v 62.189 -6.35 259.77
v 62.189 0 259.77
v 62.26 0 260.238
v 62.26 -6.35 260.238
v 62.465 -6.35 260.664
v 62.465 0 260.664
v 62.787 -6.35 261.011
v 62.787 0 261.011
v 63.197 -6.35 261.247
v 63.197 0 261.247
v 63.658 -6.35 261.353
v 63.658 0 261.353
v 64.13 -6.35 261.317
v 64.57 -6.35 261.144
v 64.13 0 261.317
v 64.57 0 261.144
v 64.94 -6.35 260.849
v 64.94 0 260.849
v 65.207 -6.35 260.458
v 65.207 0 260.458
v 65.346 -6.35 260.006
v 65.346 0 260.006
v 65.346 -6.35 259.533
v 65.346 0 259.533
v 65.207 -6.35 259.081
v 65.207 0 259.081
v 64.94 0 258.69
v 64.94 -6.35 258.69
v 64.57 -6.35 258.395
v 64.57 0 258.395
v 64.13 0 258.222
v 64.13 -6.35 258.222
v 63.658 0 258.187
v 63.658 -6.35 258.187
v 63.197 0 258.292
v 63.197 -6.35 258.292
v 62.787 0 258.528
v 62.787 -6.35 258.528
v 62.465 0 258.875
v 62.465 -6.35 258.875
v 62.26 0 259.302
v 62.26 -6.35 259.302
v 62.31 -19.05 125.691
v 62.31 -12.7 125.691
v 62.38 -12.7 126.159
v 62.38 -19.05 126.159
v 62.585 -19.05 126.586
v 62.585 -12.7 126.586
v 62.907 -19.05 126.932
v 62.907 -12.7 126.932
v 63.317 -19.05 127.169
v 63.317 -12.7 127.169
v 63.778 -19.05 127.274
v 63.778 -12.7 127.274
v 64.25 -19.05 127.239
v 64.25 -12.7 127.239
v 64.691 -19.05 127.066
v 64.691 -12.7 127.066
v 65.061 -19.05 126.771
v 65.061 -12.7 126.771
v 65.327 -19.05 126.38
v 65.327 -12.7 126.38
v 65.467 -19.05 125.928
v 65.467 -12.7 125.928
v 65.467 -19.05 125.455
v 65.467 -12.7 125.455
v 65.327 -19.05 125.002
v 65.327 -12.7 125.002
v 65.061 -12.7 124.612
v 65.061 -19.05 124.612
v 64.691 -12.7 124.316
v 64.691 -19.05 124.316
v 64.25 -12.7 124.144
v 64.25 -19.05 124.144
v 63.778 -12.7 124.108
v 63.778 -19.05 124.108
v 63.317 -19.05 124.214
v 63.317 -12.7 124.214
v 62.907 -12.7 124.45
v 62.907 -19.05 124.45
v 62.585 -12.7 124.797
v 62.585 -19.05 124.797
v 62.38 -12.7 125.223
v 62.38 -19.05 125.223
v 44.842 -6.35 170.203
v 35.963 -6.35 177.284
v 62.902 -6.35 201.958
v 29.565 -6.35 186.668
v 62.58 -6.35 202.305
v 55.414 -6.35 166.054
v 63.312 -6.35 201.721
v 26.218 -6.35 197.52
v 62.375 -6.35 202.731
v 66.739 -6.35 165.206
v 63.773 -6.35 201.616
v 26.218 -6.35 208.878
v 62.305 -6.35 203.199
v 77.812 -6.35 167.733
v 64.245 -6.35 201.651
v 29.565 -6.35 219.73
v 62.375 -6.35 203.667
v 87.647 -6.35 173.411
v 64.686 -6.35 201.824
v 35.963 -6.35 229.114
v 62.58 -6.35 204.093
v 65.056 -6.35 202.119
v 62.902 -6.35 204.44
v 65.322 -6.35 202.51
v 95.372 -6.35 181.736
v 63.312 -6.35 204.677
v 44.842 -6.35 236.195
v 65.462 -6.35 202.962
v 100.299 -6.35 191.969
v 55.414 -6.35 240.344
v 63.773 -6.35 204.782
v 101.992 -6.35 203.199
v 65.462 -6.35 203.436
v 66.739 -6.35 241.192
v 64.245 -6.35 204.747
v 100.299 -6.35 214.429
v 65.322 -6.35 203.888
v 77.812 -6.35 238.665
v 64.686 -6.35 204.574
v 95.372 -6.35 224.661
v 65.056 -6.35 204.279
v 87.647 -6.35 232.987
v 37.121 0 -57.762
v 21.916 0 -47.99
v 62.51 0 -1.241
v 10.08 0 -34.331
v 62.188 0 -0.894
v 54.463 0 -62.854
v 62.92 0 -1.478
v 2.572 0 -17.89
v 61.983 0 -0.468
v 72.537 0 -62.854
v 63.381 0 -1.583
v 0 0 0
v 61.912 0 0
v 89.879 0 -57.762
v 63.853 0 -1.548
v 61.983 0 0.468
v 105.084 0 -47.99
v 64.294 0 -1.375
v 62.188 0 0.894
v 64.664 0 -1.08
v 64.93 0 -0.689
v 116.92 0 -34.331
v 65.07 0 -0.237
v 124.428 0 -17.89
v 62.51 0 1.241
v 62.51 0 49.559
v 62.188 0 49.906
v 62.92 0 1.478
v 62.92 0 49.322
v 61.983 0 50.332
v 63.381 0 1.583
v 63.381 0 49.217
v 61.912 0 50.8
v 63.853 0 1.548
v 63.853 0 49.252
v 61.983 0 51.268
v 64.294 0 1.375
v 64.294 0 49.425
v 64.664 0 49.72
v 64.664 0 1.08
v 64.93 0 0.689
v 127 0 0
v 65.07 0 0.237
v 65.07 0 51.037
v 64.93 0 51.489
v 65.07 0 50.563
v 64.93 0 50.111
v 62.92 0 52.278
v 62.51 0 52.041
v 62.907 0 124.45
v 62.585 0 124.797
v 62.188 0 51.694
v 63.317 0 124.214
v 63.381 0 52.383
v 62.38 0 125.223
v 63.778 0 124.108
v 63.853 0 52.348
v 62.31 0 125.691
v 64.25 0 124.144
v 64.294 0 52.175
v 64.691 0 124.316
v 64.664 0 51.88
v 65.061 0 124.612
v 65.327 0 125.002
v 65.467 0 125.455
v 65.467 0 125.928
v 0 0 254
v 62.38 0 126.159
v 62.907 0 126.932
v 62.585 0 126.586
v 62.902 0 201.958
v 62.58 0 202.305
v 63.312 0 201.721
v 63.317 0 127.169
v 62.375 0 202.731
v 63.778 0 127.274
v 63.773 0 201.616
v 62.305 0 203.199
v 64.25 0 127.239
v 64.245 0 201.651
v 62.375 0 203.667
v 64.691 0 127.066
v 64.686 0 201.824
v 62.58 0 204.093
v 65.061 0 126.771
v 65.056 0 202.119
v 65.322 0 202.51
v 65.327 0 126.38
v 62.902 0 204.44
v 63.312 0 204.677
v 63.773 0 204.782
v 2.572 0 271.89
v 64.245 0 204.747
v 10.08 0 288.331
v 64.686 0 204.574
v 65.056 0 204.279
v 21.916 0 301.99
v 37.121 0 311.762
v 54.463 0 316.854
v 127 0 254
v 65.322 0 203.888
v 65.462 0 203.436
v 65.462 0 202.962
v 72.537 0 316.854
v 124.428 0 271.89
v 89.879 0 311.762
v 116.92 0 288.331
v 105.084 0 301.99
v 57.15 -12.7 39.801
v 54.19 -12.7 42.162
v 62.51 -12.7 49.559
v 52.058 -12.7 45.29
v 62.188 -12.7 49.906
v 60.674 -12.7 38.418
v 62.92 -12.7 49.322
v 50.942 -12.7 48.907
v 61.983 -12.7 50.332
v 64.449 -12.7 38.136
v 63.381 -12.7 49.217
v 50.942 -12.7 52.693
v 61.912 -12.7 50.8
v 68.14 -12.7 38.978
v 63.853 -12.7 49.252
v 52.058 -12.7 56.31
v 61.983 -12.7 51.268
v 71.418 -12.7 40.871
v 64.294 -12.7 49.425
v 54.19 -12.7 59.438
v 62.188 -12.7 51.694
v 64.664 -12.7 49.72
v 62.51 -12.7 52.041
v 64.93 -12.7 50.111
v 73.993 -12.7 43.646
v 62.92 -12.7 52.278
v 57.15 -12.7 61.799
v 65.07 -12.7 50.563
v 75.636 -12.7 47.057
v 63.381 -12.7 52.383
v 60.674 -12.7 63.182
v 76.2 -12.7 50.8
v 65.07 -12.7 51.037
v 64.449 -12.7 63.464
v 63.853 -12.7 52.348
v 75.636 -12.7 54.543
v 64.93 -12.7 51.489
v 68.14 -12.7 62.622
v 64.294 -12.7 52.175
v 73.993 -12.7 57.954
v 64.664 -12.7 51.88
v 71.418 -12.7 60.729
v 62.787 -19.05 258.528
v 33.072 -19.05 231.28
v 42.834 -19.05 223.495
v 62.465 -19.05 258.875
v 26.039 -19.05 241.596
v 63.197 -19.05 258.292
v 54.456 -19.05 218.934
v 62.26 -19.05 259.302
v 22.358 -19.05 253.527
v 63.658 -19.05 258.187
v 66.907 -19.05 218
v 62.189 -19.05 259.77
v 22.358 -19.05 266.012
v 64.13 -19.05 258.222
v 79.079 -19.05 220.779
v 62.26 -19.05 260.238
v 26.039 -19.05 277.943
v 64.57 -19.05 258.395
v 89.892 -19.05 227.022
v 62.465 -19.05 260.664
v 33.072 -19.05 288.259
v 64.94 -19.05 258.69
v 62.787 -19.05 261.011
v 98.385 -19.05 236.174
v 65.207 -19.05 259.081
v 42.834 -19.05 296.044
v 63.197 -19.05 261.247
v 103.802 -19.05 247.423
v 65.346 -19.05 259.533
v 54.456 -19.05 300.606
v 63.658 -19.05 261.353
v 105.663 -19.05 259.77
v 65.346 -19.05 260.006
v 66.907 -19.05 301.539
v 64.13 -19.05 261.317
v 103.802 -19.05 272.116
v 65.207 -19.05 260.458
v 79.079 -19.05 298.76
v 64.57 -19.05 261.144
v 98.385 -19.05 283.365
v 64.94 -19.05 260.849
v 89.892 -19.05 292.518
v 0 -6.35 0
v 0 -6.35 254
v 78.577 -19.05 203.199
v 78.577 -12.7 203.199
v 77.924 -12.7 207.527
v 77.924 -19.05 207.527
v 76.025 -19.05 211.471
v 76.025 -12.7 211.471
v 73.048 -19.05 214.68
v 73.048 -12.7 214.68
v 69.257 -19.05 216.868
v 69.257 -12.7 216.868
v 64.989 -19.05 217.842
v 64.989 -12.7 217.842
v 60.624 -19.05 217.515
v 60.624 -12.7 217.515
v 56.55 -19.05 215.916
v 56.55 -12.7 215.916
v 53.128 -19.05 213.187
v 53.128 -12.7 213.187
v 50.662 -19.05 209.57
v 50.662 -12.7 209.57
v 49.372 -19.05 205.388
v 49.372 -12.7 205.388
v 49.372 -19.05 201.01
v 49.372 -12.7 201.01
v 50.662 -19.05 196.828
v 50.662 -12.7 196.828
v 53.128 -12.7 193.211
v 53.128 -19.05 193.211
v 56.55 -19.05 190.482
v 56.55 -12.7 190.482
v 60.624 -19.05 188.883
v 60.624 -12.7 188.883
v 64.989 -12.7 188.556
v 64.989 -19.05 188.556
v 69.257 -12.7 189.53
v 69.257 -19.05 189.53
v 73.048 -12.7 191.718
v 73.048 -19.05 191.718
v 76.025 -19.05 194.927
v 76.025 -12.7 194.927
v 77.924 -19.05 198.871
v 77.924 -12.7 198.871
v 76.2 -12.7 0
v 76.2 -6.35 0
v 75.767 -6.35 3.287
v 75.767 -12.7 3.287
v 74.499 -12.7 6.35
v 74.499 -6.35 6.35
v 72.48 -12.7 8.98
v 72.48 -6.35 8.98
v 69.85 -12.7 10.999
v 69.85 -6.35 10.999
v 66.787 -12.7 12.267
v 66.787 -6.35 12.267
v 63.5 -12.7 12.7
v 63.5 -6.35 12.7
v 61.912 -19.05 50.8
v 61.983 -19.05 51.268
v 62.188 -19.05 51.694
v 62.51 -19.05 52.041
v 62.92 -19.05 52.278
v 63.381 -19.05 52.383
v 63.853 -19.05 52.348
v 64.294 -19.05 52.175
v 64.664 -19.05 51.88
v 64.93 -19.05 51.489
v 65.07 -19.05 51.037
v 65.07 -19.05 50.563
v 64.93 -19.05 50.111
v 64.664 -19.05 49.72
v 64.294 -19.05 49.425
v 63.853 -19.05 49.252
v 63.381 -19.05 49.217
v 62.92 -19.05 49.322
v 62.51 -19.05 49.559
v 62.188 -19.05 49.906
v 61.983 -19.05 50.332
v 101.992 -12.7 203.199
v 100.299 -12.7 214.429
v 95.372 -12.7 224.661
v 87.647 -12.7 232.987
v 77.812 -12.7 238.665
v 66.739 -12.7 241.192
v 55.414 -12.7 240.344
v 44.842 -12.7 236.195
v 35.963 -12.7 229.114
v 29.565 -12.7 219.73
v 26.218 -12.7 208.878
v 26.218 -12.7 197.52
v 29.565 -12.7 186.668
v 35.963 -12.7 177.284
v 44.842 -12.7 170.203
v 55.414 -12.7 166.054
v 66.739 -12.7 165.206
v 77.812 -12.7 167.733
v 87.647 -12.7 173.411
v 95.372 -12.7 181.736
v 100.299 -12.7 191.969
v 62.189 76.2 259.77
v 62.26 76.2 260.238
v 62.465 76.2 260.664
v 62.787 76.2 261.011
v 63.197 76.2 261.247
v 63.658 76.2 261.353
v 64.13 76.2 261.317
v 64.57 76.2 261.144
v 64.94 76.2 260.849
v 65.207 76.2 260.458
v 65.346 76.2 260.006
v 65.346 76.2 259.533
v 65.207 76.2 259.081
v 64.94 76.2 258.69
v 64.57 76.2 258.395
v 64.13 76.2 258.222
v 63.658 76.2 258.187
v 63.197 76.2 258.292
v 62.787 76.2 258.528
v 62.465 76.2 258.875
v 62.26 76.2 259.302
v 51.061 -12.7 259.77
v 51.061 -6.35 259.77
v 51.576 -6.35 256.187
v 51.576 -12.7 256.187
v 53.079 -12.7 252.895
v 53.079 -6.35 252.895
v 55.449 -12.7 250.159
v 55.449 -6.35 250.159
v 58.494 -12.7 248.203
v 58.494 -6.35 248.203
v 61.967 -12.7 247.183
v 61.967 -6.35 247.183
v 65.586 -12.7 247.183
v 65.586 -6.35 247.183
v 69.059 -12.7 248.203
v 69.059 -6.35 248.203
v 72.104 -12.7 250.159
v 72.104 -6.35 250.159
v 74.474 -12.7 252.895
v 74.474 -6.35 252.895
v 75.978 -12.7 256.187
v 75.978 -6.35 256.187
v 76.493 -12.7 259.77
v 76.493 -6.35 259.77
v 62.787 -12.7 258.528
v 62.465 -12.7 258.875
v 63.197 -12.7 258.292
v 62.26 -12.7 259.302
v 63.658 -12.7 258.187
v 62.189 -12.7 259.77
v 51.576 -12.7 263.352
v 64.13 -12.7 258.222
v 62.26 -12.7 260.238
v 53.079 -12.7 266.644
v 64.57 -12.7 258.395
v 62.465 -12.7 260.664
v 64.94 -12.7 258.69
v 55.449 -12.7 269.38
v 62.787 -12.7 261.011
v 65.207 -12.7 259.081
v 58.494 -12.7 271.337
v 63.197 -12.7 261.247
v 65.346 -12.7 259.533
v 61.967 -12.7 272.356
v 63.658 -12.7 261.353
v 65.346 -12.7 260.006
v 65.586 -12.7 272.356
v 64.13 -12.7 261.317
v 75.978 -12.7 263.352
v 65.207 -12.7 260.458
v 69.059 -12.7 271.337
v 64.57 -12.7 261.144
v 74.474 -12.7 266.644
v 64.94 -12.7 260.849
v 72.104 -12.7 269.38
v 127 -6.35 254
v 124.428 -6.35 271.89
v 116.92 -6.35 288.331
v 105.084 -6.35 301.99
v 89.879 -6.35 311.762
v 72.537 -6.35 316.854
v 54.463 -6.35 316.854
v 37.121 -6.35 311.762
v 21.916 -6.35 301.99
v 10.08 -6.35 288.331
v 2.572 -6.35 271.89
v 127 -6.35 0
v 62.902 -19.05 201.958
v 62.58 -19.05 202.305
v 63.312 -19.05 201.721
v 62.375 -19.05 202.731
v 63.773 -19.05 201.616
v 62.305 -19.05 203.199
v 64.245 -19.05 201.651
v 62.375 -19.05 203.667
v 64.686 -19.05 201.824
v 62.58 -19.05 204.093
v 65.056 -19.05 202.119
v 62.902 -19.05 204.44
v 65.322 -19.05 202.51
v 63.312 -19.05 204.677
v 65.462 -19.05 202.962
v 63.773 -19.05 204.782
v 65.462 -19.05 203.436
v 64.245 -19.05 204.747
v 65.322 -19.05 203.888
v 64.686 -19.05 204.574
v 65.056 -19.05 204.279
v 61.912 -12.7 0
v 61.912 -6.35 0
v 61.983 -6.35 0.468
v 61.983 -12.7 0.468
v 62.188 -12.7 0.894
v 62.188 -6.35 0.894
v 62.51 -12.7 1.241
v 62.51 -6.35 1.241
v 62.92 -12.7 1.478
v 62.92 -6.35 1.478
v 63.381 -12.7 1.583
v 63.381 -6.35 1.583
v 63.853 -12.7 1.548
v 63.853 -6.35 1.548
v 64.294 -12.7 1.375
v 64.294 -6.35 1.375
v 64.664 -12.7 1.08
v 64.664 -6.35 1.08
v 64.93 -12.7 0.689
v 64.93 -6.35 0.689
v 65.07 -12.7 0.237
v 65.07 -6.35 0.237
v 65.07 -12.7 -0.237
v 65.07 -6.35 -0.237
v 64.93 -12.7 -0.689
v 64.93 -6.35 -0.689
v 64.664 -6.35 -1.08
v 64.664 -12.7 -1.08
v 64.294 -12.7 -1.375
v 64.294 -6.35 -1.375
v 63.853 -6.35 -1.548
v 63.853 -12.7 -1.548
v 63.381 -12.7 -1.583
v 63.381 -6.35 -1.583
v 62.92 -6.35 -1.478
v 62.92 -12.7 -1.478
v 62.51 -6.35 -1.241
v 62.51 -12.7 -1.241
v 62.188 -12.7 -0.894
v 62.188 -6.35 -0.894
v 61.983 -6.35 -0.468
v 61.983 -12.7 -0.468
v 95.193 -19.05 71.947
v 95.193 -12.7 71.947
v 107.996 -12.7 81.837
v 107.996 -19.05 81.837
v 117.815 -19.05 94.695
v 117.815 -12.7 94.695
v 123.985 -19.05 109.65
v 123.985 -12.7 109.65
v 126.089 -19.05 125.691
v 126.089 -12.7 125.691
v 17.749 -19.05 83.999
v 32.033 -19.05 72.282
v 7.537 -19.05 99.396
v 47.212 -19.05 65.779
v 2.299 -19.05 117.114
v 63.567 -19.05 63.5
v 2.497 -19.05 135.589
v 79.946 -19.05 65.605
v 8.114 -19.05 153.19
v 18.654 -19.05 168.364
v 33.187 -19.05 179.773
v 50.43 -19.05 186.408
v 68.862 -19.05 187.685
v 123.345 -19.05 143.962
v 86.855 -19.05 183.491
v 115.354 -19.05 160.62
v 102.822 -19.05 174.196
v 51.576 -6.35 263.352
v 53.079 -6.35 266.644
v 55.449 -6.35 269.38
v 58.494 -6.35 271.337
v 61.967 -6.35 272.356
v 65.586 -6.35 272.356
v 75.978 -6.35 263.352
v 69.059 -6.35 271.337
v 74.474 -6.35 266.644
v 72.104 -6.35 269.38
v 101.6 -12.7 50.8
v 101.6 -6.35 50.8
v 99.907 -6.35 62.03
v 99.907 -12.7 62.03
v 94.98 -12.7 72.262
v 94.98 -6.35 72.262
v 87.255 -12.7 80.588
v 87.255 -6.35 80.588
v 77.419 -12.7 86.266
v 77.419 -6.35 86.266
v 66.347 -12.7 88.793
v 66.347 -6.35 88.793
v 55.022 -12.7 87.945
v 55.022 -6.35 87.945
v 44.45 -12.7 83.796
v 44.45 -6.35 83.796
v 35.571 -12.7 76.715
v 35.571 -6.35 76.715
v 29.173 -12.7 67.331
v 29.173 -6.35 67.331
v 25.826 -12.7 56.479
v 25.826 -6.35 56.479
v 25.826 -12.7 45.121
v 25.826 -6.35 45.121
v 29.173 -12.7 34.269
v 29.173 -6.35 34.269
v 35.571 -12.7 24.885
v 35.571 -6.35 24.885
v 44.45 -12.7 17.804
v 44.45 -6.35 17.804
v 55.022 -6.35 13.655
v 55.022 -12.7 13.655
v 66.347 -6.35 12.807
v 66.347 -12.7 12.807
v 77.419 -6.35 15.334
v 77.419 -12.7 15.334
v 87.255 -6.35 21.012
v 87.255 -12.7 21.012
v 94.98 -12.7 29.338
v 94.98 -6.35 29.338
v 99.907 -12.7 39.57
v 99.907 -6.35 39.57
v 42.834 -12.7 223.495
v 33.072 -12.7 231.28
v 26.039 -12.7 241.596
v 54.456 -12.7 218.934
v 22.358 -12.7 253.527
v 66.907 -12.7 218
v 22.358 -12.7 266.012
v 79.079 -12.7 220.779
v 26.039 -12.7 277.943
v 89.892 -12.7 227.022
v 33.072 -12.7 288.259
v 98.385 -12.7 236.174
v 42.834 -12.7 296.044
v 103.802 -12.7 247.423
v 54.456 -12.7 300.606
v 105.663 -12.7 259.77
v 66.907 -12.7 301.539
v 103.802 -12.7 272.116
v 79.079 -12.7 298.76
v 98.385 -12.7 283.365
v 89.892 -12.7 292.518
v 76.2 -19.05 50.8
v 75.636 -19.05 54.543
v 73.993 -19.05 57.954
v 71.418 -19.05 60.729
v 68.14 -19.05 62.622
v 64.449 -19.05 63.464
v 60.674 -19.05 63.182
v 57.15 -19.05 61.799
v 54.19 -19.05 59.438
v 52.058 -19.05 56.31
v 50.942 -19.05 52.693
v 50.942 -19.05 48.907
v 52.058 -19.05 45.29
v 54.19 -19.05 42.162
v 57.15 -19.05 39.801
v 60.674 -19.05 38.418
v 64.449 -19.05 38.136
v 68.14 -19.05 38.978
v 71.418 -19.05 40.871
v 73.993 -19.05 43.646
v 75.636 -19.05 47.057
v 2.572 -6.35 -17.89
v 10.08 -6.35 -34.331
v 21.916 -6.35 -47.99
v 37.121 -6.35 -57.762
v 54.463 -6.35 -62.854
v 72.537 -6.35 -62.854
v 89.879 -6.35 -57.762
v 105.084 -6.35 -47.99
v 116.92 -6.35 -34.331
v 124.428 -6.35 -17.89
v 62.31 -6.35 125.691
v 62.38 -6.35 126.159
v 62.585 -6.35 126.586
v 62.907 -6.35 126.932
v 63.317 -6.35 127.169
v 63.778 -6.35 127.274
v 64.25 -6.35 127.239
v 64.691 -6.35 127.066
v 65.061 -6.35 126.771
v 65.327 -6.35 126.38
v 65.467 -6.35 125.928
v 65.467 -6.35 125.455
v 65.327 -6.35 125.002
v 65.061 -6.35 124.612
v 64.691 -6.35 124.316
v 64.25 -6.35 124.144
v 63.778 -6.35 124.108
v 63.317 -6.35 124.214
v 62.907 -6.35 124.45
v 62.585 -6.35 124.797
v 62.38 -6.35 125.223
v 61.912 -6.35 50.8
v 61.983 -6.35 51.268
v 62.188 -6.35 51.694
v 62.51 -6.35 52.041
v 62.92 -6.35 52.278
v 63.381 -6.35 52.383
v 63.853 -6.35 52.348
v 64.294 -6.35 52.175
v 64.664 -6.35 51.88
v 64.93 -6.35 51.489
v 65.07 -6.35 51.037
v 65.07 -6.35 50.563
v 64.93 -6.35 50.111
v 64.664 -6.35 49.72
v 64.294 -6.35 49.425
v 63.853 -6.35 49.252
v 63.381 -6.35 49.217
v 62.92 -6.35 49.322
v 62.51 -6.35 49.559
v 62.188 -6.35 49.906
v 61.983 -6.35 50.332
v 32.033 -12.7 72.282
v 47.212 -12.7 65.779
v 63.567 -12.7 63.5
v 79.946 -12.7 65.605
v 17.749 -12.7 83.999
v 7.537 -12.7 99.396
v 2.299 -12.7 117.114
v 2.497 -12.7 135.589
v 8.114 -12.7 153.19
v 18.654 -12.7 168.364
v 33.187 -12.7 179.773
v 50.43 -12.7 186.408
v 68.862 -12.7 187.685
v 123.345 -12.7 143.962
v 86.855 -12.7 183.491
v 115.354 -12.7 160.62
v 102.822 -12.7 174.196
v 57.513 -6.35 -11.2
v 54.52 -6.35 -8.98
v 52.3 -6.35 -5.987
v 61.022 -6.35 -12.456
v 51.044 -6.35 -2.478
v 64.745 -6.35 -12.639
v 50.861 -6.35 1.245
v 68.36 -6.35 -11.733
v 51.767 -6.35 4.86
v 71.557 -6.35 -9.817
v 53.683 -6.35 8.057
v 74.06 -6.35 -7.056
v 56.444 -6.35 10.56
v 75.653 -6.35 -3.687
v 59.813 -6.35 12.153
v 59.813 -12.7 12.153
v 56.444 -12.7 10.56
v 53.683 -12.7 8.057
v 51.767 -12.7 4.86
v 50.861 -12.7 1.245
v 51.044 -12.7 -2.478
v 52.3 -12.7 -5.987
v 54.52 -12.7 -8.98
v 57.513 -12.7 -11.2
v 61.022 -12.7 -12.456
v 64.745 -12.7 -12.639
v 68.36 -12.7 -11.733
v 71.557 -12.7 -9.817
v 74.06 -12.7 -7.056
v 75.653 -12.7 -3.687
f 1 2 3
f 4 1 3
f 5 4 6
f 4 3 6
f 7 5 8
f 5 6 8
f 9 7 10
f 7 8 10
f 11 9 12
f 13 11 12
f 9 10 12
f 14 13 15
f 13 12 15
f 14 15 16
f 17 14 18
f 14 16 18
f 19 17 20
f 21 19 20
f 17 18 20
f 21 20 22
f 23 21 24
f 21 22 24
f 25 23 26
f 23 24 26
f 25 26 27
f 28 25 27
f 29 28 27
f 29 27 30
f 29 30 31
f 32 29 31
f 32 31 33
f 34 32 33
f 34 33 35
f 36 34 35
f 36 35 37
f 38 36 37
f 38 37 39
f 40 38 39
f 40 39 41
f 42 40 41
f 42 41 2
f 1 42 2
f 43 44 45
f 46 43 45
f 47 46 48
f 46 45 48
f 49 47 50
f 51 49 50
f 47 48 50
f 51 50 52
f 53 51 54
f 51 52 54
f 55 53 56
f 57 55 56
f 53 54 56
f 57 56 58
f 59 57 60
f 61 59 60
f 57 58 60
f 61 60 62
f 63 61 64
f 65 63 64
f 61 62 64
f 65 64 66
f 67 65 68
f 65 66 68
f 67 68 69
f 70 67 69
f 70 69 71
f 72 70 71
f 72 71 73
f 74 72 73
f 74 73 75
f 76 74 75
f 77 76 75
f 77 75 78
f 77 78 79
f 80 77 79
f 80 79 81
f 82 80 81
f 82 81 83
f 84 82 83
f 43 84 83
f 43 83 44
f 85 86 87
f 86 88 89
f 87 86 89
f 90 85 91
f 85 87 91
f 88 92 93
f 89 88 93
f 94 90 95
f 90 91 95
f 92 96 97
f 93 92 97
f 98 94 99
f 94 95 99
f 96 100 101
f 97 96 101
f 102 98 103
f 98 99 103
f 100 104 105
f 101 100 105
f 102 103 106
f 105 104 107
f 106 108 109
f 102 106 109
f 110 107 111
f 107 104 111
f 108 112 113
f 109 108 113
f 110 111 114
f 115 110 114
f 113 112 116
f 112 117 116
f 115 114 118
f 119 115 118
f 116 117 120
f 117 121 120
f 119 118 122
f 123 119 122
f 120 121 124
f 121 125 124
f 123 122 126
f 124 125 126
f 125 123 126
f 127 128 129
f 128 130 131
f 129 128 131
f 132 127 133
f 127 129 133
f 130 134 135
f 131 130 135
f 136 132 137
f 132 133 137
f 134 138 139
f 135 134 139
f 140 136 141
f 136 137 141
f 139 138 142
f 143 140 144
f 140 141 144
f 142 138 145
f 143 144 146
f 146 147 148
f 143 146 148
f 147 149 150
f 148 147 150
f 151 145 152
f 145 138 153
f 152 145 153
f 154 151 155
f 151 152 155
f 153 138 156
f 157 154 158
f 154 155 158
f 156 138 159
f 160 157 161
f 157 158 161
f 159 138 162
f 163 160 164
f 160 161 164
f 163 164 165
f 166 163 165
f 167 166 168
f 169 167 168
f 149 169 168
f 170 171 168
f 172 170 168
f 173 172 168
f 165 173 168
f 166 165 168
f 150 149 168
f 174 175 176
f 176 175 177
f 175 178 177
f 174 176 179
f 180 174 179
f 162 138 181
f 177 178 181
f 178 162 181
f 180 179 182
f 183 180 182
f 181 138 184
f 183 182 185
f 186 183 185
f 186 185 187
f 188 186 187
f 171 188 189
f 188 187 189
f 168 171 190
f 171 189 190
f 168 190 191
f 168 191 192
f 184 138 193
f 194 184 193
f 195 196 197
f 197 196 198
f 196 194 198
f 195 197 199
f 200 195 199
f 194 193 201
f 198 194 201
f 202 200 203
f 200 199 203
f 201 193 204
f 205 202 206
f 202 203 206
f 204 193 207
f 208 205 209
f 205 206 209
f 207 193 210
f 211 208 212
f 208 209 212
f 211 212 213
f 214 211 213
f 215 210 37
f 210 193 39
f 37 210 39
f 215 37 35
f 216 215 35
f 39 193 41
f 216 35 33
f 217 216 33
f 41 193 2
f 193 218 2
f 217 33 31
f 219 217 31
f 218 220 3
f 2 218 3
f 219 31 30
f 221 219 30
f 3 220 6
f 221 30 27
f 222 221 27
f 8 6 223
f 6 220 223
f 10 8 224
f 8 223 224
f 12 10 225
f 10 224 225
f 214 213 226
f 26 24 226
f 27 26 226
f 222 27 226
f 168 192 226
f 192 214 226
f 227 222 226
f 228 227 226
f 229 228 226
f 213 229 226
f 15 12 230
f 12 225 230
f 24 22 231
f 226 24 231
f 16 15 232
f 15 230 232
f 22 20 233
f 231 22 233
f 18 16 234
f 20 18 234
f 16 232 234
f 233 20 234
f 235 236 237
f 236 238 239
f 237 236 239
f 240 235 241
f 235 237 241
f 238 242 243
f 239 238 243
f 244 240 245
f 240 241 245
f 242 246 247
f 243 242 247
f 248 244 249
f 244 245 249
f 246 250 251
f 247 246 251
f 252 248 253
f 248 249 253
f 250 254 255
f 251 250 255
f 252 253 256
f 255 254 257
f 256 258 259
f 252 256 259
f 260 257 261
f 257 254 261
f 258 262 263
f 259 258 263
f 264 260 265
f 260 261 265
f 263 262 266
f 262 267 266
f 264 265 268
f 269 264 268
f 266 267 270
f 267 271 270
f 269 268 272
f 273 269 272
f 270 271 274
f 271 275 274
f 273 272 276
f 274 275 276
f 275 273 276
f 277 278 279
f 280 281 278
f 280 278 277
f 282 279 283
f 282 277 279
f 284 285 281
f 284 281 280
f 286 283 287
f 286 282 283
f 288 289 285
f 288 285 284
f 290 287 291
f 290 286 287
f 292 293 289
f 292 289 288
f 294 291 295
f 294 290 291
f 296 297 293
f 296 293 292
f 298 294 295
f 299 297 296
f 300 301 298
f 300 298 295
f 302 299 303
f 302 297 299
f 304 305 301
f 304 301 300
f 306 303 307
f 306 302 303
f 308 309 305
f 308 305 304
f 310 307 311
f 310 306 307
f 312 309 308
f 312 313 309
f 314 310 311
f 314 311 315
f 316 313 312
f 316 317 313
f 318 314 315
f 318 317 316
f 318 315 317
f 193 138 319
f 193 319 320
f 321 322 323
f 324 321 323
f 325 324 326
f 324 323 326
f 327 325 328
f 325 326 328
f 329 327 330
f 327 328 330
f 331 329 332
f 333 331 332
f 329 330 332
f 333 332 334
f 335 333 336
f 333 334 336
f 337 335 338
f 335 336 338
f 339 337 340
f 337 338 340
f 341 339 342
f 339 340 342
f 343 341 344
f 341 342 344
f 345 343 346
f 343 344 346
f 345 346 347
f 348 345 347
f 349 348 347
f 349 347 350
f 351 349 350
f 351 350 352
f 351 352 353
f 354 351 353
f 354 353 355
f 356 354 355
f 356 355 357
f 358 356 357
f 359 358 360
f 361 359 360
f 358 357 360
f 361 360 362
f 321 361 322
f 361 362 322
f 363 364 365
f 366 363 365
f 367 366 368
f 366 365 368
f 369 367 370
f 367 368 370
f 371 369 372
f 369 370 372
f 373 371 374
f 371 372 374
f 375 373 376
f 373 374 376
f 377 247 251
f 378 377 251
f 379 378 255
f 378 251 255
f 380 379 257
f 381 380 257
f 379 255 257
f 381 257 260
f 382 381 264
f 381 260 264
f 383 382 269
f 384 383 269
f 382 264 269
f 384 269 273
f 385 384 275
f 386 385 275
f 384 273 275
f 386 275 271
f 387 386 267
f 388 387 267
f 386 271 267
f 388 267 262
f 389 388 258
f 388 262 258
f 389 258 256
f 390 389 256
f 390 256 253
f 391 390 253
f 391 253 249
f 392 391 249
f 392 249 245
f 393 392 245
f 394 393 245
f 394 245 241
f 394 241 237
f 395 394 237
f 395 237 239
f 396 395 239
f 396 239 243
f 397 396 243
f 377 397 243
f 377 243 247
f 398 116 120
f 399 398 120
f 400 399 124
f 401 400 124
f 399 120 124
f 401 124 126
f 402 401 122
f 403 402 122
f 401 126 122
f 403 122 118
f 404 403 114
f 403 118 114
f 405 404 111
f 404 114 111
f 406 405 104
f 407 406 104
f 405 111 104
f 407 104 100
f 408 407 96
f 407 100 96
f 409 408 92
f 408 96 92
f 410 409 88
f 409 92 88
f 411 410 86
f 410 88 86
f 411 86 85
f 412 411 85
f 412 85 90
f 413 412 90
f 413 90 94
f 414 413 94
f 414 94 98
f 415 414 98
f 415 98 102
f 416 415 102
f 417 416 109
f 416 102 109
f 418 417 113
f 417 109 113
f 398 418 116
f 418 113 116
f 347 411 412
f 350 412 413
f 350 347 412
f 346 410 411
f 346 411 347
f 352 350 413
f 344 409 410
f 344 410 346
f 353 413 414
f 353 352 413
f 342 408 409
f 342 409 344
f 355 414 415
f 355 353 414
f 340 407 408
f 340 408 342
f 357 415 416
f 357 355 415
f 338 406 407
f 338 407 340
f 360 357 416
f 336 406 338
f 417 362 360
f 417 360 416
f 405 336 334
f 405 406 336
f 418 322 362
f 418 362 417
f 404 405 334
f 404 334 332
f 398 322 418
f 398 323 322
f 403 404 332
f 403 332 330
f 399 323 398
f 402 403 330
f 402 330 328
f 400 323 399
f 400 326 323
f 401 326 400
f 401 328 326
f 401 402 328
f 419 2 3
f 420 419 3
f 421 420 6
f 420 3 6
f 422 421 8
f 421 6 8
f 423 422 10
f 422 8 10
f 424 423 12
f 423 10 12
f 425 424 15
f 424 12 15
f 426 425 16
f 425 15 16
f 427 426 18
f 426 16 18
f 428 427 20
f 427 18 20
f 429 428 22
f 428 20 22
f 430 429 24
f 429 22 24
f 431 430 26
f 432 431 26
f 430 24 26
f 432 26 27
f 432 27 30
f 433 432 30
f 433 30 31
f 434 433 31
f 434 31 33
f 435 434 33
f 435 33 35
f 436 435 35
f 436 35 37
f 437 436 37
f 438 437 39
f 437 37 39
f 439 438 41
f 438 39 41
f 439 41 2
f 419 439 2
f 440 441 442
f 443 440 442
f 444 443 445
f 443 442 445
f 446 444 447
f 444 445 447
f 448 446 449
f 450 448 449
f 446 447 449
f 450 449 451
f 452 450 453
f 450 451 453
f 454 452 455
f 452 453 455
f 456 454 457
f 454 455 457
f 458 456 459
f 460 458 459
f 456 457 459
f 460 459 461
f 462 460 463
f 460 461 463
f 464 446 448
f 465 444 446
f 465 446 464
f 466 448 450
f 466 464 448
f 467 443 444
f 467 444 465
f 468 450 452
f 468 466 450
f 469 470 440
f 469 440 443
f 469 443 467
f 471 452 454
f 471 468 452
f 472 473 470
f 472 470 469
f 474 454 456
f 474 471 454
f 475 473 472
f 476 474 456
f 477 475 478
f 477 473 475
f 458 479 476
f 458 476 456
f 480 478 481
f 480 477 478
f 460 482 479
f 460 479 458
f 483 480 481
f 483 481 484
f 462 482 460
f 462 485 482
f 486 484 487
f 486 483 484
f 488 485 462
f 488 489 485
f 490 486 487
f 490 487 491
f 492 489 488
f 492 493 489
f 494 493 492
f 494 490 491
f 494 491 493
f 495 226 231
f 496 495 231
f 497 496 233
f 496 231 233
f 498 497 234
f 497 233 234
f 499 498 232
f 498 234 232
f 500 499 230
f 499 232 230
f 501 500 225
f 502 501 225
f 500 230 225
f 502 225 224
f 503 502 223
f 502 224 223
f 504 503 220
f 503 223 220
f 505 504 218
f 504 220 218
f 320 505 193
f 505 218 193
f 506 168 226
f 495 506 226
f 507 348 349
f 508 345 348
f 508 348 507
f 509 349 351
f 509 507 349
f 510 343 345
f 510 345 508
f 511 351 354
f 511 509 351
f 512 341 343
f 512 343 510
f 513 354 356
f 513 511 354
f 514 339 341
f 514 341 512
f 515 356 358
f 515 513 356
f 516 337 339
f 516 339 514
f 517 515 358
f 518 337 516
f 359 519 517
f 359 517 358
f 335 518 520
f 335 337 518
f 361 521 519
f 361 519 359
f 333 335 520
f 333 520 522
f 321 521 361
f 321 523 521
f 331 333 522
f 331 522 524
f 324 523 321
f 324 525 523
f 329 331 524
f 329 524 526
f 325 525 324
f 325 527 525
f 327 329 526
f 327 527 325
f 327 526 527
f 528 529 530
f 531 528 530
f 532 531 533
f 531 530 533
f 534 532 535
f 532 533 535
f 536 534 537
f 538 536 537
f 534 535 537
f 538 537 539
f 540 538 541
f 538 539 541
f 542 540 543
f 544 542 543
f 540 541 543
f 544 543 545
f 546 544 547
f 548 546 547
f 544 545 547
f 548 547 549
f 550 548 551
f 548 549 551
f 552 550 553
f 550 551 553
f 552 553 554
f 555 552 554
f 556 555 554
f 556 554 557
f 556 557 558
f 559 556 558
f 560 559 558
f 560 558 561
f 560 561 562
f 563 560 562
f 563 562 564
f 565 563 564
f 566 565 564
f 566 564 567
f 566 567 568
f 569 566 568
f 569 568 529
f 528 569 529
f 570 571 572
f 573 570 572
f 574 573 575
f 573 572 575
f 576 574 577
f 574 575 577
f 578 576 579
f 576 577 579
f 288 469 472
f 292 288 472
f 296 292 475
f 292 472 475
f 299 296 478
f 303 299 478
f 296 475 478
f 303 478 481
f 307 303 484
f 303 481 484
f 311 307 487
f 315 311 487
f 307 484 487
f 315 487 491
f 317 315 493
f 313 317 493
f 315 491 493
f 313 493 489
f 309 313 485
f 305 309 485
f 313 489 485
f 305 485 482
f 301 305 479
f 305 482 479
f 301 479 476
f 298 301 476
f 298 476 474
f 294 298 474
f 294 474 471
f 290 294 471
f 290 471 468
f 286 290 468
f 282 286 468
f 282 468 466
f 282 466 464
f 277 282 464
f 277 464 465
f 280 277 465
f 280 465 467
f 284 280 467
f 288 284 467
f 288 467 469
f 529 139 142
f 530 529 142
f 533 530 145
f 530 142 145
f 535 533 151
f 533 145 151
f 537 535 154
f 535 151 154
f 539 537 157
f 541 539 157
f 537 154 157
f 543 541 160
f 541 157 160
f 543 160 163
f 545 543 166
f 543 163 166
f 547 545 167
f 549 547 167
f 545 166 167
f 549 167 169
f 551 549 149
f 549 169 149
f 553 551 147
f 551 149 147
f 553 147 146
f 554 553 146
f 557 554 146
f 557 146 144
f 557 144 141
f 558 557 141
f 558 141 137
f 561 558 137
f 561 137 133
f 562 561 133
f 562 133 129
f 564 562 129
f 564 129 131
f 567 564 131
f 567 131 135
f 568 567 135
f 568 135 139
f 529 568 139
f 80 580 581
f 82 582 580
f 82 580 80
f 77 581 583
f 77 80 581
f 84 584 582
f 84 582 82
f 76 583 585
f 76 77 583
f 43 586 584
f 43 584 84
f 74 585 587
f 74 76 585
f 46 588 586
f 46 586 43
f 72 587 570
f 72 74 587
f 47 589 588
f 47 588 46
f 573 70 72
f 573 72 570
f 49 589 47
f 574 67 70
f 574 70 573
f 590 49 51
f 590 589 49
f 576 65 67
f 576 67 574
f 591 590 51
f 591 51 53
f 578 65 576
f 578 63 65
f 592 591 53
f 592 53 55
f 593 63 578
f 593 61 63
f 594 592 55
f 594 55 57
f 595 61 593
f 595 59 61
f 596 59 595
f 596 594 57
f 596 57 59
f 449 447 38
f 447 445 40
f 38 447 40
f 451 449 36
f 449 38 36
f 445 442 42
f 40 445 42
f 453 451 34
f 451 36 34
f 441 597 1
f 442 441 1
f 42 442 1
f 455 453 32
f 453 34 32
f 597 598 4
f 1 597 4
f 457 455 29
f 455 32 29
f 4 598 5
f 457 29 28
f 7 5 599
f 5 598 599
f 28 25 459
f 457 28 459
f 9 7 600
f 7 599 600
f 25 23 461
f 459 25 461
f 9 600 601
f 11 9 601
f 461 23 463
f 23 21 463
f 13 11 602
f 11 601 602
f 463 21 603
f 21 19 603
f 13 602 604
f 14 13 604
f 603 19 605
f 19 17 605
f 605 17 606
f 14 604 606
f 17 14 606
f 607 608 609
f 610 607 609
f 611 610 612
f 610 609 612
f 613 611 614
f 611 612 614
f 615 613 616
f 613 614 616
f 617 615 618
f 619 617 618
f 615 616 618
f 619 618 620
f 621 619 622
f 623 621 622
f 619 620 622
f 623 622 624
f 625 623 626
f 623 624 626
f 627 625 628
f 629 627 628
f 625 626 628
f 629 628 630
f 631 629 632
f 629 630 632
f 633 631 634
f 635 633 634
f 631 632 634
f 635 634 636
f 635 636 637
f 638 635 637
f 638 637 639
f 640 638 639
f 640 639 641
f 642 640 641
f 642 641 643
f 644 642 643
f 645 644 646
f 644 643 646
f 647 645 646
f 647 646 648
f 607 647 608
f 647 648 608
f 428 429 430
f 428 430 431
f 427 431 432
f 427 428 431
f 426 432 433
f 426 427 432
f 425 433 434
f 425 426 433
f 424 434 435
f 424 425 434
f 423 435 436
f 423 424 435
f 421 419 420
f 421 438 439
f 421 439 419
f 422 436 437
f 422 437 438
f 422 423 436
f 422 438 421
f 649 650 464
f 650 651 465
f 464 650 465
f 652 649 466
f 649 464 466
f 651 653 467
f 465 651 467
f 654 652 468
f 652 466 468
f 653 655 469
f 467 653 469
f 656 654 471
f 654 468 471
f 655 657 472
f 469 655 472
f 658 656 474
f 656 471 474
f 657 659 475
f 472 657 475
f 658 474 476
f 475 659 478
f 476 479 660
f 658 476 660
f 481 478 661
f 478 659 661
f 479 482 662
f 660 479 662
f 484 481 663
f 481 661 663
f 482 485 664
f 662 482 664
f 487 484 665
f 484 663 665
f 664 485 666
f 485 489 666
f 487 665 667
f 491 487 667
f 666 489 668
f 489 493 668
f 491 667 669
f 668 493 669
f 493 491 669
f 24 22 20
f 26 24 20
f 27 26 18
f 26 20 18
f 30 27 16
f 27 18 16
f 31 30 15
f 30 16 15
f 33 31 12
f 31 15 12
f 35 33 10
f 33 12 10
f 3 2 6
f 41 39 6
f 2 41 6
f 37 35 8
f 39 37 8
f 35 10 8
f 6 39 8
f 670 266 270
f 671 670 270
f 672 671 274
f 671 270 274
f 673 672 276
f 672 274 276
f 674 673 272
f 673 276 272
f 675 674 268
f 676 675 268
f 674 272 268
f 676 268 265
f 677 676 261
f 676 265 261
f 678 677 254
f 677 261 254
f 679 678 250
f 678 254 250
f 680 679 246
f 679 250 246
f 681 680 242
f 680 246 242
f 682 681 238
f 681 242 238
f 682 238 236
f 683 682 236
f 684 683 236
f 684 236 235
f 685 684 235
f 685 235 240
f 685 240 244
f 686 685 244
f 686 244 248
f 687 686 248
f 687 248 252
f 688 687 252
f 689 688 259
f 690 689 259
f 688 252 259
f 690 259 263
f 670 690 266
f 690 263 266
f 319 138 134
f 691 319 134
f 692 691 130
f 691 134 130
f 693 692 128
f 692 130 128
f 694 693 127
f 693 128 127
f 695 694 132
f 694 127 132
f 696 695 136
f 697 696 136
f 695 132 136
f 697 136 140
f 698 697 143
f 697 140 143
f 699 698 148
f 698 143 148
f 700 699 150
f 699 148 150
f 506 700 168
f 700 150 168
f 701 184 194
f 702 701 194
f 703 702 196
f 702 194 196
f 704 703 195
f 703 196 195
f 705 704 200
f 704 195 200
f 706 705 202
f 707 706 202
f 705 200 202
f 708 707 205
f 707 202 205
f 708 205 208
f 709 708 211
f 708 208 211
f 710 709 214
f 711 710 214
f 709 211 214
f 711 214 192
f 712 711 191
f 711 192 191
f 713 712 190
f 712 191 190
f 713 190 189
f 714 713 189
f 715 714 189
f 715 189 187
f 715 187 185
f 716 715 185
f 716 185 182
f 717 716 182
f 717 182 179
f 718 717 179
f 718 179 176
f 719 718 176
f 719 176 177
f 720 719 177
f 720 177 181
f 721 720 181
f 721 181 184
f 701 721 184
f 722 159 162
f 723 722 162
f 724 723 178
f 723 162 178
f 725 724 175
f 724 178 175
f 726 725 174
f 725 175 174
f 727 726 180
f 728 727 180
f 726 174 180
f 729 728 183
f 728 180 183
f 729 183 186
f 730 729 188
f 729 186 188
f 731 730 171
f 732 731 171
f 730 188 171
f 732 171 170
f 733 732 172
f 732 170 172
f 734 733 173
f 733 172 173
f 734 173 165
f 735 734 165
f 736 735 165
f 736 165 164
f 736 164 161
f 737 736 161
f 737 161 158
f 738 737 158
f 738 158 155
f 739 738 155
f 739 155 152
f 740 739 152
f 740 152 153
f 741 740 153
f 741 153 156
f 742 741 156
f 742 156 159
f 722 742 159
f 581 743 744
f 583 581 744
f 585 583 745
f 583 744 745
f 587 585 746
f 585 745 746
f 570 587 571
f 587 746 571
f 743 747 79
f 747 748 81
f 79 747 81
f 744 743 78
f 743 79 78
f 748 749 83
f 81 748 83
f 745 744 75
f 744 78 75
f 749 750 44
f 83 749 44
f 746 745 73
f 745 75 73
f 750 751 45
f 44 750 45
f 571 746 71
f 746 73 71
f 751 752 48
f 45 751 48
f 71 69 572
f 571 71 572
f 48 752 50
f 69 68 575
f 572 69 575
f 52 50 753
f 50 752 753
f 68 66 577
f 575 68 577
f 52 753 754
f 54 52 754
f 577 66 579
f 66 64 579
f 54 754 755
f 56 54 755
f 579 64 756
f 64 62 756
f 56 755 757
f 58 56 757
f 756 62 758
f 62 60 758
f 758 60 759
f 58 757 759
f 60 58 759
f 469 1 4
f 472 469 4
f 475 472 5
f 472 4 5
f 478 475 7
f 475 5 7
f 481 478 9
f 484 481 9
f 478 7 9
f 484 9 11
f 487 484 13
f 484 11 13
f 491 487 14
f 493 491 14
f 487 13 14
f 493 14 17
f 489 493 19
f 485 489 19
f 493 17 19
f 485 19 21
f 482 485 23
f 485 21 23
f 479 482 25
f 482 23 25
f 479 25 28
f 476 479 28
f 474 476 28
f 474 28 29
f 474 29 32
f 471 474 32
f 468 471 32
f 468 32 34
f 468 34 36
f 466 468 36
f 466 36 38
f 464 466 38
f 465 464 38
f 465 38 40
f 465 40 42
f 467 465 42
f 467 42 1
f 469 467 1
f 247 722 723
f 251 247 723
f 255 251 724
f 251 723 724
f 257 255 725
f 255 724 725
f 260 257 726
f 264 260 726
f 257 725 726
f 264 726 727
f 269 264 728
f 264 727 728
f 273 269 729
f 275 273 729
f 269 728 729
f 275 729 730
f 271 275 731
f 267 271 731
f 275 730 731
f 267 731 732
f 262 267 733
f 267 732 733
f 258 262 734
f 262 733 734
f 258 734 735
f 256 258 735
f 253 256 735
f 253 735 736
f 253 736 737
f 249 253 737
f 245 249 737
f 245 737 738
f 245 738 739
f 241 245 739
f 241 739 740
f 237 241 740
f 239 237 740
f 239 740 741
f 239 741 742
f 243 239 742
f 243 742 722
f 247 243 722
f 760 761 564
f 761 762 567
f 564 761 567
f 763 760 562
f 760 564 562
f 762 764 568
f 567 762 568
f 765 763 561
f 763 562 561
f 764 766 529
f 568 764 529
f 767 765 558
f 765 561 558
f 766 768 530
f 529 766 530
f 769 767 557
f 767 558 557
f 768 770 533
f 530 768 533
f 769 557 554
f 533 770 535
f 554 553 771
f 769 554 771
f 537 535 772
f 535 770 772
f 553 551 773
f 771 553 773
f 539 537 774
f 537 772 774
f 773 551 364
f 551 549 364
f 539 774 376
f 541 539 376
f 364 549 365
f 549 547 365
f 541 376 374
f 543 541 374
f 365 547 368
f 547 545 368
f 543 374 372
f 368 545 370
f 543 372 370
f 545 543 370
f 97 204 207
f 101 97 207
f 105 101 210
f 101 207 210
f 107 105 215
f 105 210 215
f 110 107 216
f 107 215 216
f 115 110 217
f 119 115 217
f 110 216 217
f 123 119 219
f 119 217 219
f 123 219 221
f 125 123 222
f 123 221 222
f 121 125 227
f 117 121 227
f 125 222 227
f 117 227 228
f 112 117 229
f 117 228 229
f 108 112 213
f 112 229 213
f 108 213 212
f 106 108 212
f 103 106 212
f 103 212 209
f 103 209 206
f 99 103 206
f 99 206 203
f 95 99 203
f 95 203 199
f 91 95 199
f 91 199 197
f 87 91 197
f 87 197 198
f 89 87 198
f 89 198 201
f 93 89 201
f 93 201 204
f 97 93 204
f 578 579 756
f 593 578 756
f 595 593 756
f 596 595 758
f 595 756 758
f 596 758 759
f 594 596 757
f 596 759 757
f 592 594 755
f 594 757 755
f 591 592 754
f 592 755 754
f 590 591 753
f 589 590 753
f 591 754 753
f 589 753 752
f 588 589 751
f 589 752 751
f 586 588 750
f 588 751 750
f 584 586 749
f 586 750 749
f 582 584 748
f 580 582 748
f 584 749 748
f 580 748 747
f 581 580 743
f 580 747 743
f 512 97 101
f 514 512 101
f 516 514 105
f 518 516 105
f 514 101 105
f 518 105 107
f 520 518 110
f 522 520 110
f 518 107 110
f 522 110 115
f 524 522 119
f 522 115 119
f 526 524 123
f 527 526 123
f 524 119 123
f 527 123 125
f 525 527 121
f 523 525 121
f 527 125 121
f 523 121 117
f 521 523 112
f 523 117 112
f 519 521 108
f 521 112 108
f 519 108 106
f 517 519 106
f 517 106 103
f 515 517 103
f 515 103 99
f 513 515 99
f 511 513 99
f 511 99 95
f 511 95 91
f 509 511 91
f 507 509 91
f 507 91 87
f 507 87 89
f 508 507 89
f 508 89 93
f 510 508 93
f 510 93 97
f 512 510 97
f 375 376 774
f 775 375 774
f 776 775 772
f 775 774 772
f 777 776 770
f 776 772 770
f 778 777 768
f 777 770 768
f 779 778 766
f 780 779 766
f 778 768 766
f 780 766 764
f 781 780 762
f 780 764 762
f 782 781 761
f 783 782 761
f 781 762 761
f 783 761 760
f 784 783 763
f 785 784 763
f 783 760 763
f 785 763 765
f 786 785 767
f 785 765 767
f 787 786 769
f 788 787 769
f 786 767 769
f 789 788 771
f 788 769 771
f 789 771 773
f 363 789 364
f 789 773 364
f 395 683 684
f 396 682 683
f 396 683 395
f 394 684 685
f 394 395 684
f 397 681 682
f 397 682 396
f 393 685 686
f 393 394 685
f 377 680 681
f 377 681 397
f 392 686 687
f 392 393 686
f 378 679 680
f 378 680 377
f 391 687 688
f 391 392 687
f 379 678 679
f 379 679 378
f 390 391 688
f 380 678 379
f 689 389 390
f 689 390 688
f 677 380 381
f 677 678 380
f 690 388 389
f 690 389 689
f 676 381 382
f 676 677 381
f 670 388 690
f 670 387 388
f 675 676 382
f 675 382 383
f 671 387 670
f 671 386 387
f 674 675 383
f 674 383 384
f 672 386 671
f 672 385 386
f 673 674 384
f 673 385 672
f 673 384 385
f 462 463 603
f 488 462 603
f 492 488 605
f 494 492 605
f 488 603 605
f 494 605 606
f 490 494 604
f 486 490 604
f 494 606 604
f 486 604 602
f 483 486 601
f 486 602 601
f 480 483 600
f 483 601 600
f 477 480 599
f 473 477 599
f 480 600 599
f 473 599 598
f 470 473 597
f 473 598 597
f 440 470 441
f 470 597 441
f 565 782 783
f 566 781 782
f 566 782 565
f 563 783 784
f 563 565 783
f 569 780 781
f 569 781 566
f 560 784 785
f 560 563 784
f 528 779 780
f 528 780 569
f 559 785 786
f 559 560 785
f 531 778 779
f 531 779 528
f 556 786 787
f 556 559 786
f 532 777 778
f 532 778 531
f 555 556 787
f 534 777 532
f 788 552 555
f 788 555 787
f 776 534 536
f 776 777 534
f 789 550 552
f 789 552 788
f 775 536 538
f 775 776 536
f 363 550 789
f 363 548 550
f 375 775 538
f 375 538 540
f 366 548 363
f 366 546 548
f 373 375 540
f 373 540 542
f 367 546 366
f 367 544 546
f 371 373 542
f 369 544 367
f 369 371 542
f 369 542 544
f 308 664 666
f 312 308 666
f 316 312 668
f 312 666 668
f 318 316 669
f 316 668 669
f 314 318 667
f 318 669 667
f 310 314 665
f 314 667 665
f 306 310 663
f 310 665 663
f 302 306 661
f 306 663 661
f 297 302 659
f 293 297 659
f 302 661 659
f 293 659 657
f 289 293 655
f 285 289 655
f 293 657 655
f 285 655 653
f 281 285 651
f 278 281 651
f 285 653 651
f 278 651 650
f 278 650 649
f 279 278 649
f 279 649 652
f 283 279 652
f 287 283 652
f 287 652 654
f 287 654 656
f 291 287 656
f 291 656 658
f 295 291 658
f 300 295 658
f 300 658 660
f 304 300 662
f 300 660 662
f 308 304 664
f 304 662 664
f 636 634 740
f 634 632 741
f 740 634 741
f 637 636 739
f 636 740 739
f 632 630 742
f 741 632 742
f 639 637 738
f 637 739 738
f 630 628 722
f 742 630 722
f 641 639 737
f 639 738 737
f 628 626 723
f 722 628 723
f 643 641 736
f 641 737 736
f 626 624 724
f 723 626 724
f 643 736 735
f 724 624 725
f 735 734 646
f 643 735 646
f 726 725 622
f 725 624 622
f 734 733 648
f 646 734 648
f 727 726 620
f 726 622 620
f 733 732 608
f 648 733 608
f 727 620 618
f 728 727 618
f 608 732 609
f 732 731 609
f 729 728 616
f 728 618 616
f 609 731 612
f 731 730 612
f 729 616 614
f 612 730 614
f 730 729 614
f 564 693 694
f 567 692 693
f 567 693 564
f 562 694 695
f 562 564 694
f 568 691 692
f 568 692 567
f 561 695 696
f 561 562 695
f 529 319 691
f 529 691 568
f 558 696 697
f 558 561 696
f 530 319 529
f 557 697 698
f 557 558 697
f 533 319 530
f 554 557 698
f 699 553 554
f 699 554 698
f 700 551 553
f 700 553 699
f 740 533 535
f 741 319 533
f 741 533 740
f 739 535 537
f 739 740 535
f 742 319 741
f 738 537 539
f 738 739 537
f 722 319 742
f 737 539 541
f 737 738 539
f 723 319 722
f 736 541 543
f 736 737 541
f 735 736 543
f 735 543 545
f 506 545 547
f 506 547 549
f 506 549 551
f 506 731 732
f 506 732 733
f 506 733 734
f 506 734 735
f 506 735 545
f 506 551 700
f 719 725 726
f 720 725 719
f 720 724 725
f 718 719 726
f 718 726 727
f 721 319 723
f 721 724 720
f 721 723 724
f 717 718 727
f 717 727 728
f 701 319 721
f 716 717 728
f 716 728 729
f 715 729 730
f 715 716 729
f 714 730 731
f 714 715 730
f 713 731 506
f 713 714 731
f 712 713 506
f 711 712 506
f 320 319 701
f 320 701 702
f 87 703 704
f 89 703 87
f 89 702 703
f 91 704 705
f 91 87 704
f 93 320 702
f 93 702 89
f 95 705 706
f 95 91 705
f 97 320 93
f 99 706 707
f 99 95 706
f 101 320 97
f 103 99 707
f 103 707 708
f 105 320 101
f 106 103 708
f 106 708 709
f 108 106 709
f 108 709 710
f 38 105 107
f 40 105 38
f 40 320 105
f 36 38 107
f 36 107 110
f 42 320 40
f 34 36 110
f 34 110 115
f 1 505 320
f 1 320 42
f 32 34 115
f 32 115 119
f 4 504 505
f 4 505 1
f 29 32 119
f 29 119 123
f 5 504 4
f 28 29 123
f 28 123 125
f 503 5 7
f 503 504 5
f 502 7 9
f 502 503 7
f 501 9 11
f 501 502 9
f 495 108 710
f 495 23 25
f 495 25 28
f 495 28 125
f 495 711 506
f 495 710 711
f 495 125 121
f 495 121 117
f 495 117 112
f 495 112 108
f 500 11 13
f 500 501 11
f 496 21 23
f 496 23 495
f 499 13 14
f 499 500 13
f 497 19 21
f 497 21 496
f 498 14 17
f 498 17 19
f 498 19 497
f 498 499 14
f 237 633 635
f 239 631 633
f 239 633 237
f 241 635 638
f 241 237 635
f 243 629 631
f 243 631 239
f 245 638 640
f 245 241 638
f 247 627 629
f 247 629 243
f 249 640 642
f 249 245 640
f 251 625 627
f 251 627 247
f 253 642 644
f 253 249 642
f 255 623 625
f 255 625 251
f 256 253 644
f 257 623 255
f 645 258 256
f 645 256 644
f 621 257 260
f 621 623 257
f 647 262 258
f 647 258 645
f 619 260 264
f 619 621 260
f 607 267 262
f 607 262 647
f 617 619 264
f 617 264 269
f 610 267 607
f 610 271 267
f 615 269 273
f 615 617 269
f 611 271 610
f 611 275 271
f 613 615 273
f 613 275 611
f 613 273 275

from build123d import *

# Parameters (mm, degrees)
F0_W      = 127
F0_H      = 254
F1_DEPTH  = 6.35
F4_DEPTH  = 6.35
F5_R      = 12.7
F6_DEPTH  = 6.35
F8_DEPTH  = 6.35
F10_DEPTH = 6.35
F11_R     = 14.6844956333
F12_DEPTH = 6.35
F14_DEPTH = 6.35
F15_R     = 41.8862190393
F16_DEPTH = 6.35
F17_R     = 1.5875
F18_DEPTH = 19.051
F19_DEPTH = 76.2


# Not quite as in the source:
# - the program builds the solid bodies; features that only make, move or delete a surface that nothing else refers to are left out


with BuildPart() as f1:
    # F0 (on Front) → F1 (new body)
    with BuildSketch(Plane.XZ):
        with Locations((63.5, 127)):
            Rectangle(F0_W, F0_H)
        with BuildLine():
            ThreePointArc((127, 254), (63.5, 317.5), (0, 254))
            Line((0, 254), (127, 254))
        make_face()
        with BuildLine():
            Line((127, 0), (0, 0))
            ThreePointArc((0, 0), (63.5, -63.5), (127, 0))
        make_face()
    extrude(amount=F1_DEPTH)


with BuildPart() as f4:
    # F2 (on face) → F4 (new body)
    with BuildSketch(Plane.XZ.offset(6.35)):
        with BuildLine():
            ThreePointArc((63.5, 88.9), (25.4, 50.7999999784), (63.5000000432, 12.7))
            ThreePointArc((63.5000000432, 12.7), (90.4407683785, 23.8592316521), (101.6, 50.8))
            ThreePointArc((101.6, 50.8), (90.4407683632, 77.7407683632), (63.5, 88.9))
        make_face()
    extrude(amount=F4_DEPTH)


with BuildPart() as f4b:
    # F2 (on face) → F4, piece 2 (new body)
    with BuildSketch(Plane.XZ.offset(6.35)):
        with BuildLine():
            ThreePointArc((63.5000000432, 12.7), (54.5197438636, -8.9802561058), (76.2, 0))
            ThreePointArc((76.2, 0), (72.4802561364, 8.9802561058), (63.5000000432, 12.7))
        make_face()
    extrude(amount=F4_DEPTH)


with BuildPart() as f6:
    # F5 (on face) → F6 (new body)
    with BuildSketch(Plane.XZ.offset(12.7)):
        with Locations((63.5, 50.8)):
            Circle(F5_R)
    extrude(amount=F6_DEPTH)


with BuildPart() as f8:
    # F7 (on face) → F8 (new body)
    with BuildSketch(Plane.XZ.offset(12.7)):
        with BuildLine():
            ThreePointArc((95.1926497876, 71.946771608), (63.7019956295, 88.8994645338), (32.0333573438, 72.2816293597))
            ThreePointArc((32.0333573438, 72.2816293597), (63.5673318765, 63.4998215113), (95.1926497876, 71.946771608))
        make_face()
        with BuildLine():
            ThreePointArc((95.1926497876, 71.946771608), (117.8147364594, 94.69498662), (126.0893906907, 125.6912797689))
            ThreePointArc((126.0893906907, 125.6912797689), (33.1870574181, 179.7725338358), (32.0333573438, 72.2816293597))
            ThreePointArc((32.0333573438, 72.2816293597), (63.7019956295, 88.8994645338), (95.1926497876, 71.946771608))
        make_face()
    extrude(amount=F8_DEPTH)


with BuildPart() as f10:
    # F3 (on face) → F10 (new body)
    with BuildSketch(Plane.XZ.offset(6.35)):
        with BuildLine():
            ThreePointArc((63.6960125926, 165.0994957849), (90.7634033509, 176.1890111487), (101.9920253124, 203.1989915691))
            ThreePointArc((101.9920253124, 203.1989915691), (37.020647274, 230.2089719896), (63.6960125926, 165.0994957849))
        make_face()
    extrude(amount=F10_DEPTH)

    # F11 (on face) → F12 (join)
    with BuildSketch(Plane.XZ.offset(12.7)):
        with Locations((63.8920253124, 203.1989915691)):
            Circle(F11_R)
    extrude(amount=F12_DEPTH)


with BuildPart() as f14:
    # F13 (on face) → F14 (new body)
    with BuildSketch(Plane.XZ.offset(6.35)):
        with BuildLine():
            ThreePointArc((76.4929108533, 259.7695887089), (63.7767091393, 272.4857904229), (51.0605074254, 259.7695887089))
            Line((51.0605074254, 259.7695887089), (76.4929108533, 259.7695887089))
        make_face()
        with BuildLine():
            Line((76.4929108533, 259.7695887089), (51.0605074254, 259.7695887089))
            ThreePointArc((51.0605074254, 259.7695887089), (63.7767091393, 247.0533869949), (76.4929108533, 259.7695887089))
        make_face()
    extrude(amount=F14_DEPTH)


with BuildPart() as f16:
    # F15 (on face) → F16 (new body)
    with BuildSketch(Plane.XZ.offset(12.7)):
        with Locations((63.7767091393, 259.7695887089)):
            Circle(F15_R)
    extrude(amount=F16_DEPTH)


with BuildPart() as f18_tool:
    # F17 (on face) → F18 (new body, through all)
    with BuildSketch(Plane(origin=(0, 0, 0), x_dir=(-1, 0, 0), z_dir=(0, 1, 0))):
        with Locations((-63.7767091393, 259.7695887089)):
            Circle(F17_R)
        with Locations((-63.8920253124, 203.1989915691)):
            Circle(F17_R)
        with Locations((-63.8970583677, 125.6912797689)):
            Circle(F17_R)
        with Locations((-63.5, 50.8)):
            Circle(F17_R)
        with Locations((-63.5, 0)):
            Circle(F17_R)
    extrude(amount=-F18_DEPTH)


with BuildPart() as f1_1:
    add(f1.part)

    # F18: cut by f18_tool
    add(f18_tool.part, mode=Mode.SUBTRACT)


with BuildPart() as f4_1:
    add(f4.part)

    # F18: cut by f18_tool
    add(f18_tool.part, mode=Mode.SUBTRACT)


with BuildPart() as f4b_1:
    add(f4b.part)

    # F18: cut by f18_tool
    add(f18_tool.part, mode=Mode.SUBTRACT)


with BuildPart() as f6_1:
    add(f6.part)

    # F18: cut by f18_tool
    add(f18_tool.part, mode=Mode.SUBTRACT)


with BuildPart() as f8_1:
    add(f8.part)

    # F18: cut by f18_tool
    add(f18_tool.part, mode=Mode.SUBTRACT)


with BuildPart() as f10_1:
    add(f10.part)

    # F18: cut by f18_tool
    add(f18_tool.part, mode=Mode.SUBTRACT)


with BuildPart() as f14_1:
    add(f14.part)

    # F18: cut by f18_tool
    add(f18_tool.part, mode=Mode.SUBTRACT)


with BuildPart() as f16_1:
    add(f16.part)

    # F18: cut by f18_tool
    add(f18_tool.part, mode=Mode.SUBTRACT)


with BuildPart() as f19:
    # F17 (on face) → F19 (new body)
    with BuildSketch(Plane(origin=(0, 0, 0), x_dir=(-1, 0, 0), z_dir=(0, 1, 0))):
        with Locations((-63.7767091393, 259.7695887089)):
            Circle(F17_R)
    extrude(amount=F19_DEPTH)


solid = Compound([f1_1.part, f4_1.part, f4b_1.part, f6_1.part, f8_1.part, f10_1.part, f14_1.part, f16_1.part, f19.part])
